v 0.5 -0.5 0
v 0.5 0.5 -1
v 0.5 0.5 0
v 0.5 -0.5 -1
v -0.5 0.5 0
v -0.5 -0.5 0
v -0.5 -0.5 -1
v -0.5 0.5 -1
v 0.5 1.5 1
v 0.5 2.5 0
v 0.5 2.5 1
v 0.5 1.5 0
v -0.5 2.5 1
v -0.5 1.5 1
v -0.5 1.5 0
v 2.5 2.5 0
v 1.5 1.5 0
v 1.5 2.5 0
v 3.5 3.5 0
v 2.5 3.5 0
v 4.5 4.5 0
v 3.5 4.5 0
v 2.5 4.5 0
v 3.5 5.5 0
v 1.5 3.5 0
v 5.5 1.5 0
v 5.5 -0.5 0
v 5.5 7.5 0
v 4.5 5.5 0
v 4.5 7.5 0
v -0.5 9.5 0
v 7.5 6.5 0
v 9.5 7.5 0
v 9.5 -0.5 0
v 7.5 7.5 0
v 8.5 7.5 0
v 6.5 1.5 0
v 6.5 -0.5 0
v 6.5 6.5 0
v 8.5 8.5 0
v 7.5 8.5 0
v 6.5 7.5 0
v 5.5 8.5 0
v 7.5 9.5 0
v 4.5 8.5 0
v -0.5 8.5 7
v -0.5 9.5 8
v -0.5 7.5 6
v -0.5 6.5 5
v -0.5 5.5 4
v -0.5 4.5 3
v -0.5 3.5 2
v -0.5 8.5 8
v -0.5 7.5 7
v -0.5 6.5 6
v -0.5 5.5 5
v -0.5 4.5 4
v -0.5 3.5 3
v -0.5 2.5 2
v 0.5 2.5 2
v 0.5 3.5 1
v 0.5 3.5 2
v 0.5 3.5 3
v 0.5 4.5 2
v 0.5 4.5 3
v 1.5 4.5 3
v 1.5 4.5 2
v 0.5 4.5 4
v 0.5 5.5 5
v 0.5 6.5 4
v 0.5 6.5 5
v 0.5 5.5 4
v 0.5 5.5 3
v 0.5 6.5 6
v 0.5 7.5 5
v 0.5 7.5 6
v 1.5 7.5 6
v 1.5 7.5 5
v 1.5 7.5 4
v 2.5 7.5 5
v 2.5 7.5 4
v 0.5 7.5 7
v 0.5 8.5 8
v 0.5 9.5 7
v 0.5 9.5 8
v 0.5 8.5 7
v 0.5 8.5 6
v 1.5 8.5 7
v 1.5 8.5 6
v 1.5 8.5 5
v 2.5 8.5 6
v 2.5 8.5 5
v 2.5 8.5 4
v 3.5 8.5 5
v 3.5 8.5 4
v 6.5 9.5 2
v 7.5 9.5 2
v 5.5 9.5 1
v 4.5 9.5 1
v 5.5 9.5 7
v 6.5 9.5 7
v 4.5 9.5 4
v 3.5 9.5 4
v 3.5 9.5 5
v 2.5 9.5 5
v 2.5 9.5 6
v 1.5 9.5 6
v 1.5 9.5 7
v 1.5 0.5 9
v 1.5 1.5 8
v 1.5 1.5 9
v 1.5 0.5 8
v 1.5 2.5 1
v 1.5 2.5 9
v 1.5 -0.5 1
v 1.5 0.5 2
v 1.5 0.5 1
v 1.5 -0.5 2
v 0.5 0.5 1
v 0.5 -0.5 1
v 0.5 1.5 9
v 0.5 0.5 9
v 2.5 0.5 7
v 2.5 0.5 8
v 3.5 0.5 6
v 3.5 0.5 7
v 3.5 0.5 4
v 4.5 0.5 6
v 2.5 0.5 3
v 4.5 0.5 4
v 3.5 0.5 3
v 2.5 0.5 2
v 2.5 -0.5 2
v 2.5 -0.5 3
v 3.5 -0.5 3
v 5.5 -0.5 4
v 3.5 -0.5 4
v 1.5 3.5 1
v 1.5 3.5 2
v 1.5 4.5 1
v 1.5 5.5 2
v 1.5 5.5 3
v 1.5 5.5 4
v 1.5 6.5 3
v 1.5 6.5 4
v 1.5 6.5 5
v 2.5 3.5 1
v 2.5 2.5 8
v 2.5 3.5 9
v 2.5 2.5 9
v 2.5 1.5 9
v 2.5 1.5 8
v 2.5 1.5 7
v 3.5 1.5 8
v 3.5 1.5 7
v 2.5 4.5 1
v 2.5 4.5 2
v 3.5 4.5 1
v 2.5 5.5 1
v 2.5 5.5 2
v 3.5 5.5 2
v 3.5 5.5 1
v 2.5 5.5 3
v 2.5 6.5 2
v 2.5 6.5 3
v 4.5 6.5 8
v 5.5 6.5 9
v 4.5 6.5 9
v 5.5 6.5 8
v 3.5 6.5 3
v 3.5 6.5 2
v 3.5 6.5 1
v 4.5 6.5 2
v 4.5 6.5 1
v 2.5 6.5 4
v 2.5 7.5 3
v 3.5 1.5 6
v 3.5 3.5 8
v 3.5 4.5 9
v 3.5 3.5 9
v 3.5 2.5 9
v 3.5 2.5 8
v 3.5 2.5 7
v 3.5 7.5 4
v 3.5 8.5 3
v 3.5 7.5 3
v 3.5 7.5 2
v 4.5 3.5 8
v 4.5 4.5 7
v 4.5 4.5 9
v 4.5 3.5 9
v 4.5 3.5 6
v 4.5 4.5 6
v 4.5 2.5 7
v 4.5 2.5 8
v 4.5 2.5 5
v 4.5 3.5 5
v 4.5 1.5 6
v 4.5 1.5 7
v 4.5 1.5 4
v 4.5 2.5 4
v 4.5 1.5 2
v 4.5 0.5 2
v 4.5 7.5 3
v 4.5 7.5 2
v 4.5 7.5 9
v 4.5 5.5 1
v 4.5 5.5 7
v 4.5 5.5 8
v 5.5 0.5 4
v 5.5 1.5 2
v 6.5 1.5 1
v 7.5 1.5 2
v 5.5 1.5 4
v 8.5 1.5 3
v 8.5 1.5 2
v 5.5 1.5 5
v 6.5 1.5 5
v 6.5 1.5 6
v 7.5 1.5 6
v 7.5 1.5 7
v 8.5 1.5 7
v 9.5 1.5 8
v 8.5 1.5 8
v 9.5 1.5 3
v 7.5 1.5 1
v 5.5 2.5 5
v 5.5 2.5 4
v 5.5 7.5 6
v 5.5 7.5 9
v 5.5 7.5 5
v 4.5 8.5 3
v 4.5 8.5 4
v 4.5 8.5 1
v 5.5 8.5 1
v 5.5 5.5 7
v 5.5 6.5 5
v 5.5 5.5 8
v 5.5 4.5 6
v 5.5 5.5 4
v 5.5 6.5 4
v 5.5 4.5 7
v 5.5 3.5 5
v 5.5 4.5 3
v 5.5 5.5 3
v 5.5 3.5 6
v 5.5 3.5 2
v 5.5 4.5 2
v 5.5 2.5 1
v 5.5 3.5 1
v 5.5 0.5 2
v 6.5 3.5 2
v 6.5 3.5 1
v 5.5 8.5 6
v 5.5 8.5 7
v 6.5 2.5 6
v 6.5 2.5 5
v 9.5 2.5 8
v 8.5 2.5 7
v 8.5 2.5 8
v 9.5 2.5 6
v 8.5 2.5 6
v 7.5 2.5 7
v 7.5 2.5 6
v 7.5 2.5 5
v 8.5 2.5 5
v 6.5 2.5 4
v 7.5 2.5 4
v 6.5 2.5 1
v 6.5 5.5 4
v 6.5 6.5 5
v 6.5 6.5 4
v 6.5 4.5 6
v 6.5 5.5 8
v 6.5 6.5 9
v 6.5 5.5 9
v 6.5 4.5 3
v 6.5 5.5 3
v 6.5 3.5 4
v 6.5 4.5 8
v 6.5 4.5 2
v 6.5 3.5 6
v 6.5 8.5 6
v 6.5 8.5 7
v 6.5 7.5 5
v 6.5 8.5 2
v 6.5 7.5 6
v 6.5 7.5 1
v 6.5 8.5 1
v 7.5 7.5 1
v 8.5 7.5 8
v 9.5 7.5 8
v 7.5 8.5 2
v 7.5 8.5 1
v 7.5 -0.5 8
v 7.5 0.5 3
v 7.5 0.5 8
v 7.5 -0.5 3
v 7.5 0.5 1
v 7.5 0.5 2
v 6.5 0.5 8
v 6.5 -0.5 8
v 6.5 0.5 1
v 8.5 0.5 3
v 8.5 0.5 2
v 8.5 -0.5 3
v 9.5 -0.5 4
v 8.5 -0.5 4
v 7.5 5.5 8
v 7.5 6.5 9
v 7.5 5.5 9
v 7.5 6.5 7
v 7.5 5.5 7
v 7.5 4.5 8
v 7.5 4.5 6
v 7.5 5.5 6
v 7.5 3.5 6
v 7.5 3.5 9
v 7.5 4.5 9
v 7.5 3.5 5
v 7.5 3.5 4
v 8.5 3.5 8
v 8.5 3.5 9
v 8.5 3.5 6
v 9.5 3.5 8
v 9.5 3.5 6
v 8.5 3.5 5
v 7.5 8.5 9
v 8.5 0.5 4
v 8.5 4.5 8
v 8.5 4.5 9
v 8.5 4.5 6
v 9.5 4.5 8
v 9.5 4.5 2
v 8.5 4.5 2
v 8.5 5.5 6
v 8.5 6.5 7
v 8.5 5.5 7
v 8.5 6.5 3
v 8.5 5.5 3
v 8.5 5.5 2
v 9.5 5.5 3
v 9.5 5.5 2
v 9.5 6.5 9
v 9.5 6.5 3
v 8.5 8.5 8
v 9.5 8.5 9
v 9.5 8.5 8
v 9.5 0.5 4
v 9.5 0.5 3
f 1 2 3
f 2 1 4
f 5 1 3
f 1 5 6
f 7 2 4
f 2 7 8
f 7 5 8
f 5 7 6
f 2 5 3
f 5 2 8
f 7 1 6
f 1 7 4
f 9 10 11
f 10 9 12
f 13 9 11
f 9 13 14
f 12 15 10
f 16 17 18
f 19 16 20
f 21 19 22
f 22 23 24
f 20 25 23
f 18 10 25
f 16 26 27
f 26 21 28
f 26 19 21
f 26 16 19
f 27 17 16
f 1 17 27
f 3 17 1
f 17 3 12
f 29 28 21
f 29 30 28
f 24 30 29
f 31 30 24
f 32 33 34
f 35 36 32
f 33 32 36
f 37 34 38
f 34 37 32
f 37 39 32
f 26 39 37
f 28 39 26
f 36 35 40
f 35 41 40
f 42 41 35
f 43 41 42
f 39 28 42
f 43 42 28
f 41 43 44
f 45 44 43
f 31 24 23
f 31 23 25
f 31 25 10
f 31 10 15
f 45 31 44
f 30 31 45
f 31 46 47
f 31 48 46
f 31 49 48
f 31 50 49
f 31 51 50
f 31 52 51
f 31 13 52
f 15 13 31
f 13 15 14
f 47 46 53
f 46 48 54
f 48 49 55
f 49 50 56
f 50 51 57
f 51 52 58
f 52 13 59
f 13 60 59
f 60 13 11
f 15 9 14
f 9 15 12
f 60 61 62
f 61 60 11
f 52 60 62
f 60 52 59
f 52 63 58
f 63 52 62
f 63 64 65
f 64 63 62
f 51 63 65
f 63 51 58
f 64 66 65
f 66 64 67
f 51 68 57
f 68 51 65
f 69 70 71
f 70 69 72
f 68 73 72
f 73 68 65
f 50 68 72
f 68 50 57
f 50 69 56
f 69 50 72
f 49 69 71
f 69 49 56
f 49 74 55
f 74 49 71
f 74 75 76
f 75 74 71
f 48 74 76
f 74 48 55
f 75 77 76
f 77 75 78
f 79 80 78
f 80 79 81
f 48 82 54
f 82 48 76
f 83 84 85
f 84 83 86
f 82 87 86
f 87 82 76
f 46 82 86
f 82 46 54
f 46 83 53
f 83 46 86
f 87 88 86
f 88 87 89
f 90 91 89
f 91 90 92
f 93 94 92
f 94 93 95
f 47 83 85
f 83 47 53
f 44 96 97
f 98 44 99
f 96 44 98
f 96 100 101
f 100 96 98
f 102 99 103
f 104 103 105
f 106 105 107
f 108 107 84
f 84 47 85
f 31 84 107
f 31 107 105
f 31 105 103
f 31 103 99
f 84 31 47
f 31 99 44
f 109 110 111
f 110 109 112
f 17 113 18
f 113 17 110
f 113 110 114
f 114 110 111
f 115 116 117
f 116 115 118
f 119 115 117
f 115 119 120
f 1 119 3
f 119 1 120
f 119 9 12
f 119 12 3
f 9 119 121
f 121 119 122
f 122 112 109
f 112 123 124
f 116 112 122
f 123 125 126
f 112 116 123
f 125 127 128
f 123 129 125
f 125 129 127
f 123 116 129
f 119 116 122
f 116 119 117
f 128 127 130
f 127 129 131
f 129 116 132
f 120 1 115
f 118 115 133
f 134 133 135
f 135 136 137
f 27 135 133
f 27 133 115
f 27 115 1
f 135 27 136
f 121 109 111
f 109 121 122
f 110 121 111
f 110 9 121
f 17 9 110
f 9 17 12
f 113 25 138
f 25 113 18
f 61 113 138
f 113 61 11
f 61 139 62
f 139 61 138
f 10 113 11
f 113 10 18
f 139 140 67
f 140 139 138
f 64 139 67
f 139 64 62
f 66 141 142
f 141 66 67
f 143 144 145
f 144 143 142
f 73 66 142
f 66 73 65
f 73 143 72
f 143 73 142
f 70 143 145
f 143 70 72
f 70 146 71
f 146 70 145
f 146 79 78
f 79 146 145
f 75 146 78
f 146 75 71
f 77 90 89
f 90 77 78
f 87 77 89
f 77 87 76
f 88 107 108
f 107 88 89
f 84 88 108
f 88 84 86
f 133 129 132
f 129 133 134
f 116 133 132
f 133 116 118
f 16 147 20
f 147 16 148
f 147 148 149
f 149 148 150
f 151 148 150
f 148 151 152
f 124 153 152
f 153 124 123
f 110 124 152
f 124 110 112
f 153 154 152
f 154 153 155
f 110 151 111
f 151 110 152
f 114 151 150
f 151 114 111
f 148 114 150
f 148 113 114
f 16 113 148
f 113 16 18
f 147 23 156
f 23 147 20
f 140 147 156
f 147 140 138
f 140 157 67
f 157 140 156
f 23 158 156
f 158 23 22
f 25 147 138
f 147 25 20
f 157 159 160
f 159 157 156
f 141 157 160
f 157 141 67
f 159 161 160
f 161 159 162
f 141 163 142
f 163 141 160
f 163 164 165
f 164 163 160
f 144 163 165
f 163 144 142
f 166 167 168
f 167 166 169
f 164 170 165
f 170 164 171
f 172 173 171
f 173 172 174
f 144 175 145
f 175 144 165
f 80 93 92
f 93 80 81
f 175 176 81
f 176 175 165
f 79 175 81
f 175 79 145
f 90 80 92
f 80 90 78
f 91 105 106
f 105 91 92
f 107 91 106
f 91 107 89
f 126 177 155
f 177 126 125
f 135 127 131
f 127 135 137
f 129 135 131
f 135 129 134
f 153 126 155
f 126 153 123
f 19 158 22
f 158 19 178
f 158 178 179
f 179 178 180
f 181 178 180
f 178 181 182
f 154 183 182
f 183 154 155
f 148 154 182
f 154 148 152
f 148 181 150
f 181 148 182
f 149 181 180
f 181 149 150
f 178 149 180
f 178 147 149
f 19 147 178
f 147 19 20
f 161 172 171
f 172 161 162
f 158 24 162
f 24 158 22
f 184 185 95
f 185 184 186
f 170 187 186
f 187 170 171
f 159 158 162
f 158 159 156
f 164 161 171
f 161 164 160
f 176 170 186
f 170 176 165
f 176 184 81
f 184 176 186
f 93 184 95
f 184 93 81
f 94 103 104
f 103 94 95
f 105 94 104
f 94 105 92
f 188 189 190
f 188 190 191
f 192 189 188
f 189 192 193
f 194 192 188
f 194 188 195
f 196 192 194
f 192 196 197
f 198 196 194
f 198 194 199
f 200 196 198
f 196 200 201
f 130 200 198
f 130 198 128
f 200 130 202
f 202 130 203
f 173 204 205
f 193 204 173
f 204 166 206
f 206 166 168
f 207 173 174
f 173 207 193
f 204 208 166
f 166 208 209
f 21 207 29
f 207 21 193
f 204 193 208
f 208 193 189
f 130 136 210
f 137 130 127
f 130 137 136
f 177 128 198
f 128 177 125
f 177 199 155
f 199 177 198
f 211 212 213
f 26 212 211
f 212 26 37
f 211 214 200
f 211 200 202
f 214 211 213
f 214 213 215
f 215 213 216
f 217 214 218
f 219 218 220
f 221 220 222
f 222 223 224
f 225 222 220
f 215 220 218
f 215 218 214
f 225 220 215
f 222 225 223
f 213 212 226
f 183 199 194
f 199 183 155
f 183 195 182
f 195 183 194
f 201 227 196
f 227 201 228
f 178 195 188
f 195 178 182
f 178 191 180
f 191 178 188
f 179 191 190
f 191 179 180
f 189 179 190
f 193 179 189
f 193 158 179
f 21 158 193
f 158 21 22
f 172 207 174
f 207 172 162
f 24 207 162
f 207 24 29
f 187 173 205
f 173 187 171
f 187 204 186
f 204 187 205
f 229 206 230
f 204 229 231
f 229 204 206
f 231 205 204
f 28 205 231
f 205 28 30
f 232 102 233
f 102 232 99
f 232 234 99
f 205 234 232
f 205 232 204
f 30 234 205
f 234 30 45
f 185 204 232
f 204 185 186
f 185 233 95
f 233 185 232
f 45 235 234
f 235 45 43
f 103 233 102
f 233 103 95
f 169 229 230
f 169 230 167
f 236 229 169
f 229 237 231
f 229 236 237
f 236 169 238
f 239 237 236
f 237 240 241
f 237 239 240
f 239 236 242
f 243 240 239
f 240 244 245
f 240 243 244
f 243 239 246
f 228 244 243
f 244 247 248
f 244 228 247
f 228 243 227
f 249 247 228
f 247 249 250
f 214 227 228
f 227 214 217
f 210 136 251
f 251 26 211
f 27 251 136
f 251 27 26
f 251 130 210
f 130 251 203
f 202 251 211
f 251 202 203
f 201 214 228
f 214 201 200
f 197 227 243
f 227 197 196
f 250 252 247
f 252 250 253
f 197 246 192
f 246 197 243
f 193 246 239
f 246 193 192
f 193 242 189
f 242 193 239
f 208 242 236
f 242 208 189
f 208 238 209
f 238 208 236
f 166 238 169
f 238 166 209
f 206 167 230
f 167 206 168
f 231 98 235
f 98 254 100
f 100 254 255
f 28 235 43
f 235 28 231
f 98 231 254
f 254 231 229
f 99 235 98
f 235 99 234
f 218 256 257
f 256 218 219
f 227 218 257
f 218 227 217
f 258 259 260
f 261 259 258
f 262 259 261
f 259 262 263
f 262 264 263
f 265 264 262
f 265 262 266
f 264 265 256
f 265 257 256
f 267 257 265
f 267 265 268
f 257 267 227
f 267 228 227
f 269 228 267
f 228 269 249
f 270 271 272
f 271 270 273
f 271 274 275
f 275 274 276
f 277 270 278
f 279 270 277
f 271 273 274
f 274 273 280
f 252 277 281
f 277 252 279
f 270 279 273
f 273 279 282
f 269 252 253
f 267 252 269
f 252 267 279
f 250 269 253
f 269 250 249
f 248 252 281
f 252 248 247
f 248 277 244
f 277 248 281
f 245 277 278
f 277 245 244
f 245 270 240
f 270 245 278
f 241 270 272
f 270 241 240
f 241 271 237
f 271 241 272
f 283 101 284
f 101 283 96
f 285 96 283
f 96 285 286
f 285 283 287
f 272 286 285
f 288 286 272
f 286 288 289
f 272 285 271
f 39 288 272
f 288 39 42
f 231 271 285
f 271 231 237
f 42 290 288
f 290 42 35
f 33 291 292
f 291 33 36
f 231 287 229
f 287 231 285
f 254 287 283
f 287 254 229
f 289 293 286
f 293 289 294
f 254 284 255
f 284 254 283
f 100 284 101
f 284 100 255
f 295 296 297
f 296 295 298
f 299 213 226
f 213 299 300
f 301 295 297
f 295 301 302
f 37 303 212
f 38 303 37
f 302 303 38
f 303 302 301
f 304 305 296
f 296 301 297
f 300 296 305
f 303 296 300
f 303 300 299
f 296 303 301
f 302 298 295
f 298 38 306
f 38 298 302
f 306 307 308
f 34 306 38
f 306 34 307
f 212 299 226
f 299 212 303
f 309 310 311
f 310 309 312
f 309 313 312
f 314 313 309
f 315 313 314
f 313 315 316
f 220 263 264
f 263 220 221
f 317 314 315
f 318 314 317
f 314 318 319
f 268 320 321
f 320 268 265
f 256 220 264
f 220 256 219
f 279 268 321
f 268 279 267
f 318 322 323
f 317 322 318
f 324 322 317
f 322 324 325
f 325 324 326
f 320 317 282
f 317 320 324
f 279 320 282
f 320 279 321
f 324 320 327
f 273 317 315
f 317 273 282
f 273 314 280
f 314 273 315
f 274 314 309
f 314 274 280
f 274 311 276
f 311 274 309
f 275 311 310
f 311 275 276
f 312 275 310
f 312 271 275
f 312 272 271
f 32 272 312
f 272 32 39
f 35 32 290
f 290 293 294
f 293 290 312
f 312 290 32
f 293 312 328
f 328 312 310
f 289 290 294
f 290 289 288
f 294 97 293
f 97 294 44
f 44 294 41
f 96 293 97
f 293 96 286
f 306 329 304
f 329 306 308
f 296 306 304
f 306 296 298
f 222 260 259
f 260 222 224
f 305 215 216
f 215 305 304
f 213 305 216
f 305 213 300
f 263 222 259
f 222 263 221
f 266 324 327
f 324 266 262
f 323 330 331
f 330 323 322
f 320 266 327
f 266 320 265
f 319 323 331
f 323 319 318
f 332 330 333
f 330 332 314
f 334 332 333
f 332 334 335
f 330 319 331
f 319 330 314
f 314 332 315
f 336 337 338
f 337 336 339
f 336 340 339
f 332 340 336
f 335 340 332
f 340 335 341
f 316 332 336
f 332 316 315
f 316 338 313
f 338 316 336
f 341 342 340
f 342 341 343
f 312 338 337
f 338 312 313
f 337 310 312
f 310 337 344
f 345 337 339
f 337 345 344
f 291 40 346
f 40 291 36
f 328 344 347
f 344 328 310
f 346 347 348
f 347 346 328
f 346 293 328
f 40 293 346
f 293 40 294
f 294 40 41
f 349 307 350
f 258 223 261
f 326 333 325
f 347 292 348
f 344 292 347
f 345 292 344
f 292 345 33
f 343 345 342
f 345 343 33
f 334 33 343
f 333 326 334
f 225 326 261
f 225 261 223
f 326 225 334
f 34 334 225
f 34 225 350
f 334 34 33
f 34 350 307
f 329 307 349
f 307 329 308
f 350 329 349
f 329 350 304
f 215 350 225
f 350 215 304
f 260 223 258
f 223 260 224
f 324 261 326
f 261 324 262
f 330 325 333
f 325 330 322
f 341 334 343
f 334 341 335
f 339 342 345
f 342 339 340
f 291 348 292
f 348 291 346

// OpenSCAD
union() {
    translate([0, 0, -0.5]) color([1, 0, 0]) cube([1, 1, 1], center=true);
    translate([0, 2, 0.5]) cube([1, 1, 1], center=true);
    translate([0, 3, 1.0]) cube([1, 1, 2], center=true);
    translate([0, 4, 1.5]) cube([1, 1, 3], center=true);
    translate([0, 5, 2.0]) cube([1, 1, 4], center=true);
    translate([0, 6, 2.5]) cube([1, 1, 5], center=true);
    translate([0, 7, 3.0]) cube([1, 1, 6], center=true);
    translate([0, 8, 3.5]) cube([1, 1, 7], center=true);
    translate([0, 9, 4.0]) cube([1, 1, 8], center=true);
    translate([1, 0, 0.5]) cube([1, 1, 1], center=true);
    translate([1, 1, 4.5]) cube([1, 1, 9], center=true);
    translate([1, 3, 0.5]) cube([1, 1, 1], center=true);
    translate([1, 4, 1.0]) cube([1, 1, 2], center=true);
    translate([1, 5, 1.5]) cube([1, 1, 3], center=true);
    translate([1, 6, 2.0]) cube([1, 1, 4], center=true);
    translate([1, 7, 2.5]) cube([1, 1, 5], center=true);
    translate([1, 8, 3.0]) cube([1, 1, 6], center=true);
    translate([1, 9, 3.5]) cube([1, 1, 7], center=true);
    translate([2, 0, 1.0]) cube([1, 1, 2], center=true);
    translate([2, 1, 4.0]) cube([1, 1, 8], center=true);
    translate([2, 2, 4.5]) cube([1, 1, 9], center=true);
    translate([2, 4, 0.5]) cube([1, 1, 1], center=true);
    translate([2, 5, 1.0]) cube([1, 1, 2], center=true);
    translate([2, 6, 1.5]) cube([1, 1, 3], center=true);
    translate([2, 7, 2.0]) cube([1, 1, 4], center=true);
    translate([2, 8, 2.5]) cube([1, 1, 5], center=true);
    translate([2, 9, 3.0]) cube([1, 1, 6], center=true);
    translate([3, 0, 1.5]) cube([1, 1, 3], center=true);
    translate([3, 1, 3.5]) cube([1, 1, 7], center=true);
    translate([3, 2, 4.0]) cube([1, 1, 8], center=true);
    translate([3, 3, 4.5]) cube([1, 1, 9], center=true);
    translate([3, 5, 0.5]) cube([1, 1, 1], center=true);
    translate([3, 6, 1.0]) cube([1, 1, 2], center=true);
    translate([3, 7, 1.5]) cube([1, 1, 3], center=true);
    translate([3, 8, 2.0]) cube([1, 1, 4], center=true);
    translate([3, 9, 2.5]) cube([1, 1, 5], center=true);
    translate([4, 0, 2.0]) cube([1, 1, 4], center=true);
    translate([4, 1, 3.0]) cube([1, 1, 6], center=true);
    translate([4, 2, 3.5]) cube([1, 1, 7], center=true);
    translate([4, 3, 4.0]) cube([1, 1, 8], center=true);
    translate([4, 4, 4.5]) cube([1, 1, 9], center=true);
    translate([4, 6, 0.5]) cube([1, 1, 1], center=true);
    translate([4, 7, 1.0]) cube([1, 1, 2], center=true);
    translate([4, 8, 1.5]) cube([1, 1, 3], center=true);
    translate([4, 9, 2.0]) cube([1, 1, 4], center=true);
    translate([5, 0, 2.0]) cube([1, 1, 4], center=true);
    translate([5, 1, 1.0]) cube([1, 1, 2], center=true);
    translate([5, 2, 2.0]) cube([1, 1, 4], center=true);
    translate([5, 3, 2.5]) cube([1, 1, 5], center=true);
    translate([5, 4, 3.0]) cube([1, 1, 6], center=true);
    translate([5, 5, 3.5]) cube([1, 1, 7], center=true);
    translate([5, 6, 4.0]) cube([1, 1, 8], center=true);
    translate([5, 7, 4.5]) cube([1, 1, 9], center=true);
    translate([5, 9, 0.5]) cube([1, 1, 1], center=true);
    translate([6, 2, 2.5]) cube([1, 1, 5], center=true);
    translate([6, 3, 0.5]) cube([1, 1, 1], center=true);
    translate([6, 4, 1.0]) cube([1, 1, 2], center=true);
    translate([6, 5, 1.5]) cube([1, 1, 3], center=true);
    translate([6, 6, 2.0]) cube([1, 1, 4], center=true);
    translate([6, 7, 2.5]) cube([1, 1, 5], center=true);
    translate([6, 8, 3.0]) cube([1, 1, 6], center=true);
    translate([6, 9, 3.5]) cube([1, 1, 7], center=true);
    translate([7, 0, 4.0]) cube([1, 1, 8], center=true);
    translate([7, 1, 0.5]) cube([1, 1, 1], center=true);
    translate([7, 2, 3.0]) cube([1, 1, 6], center=true);
    translate([7, 3, 2.0]) cube([1, 1, 4], center=true);
    translate([7, 4, 3.0]) cube([1, 1, 6], center=true);
    translate([7, 5, 4.0]) cube([1, 1, 8], center=true);
    translate([7, 6, 4.5]) cube([1, 1, 9], center=true);
    translate([7, 8, 0.5]) cube([1, 1, 1], center=true);
    translate([7, 9, 1.0]) cube([1, 1, 2], center=true);
    translate([8, 0, 1.5]) cube([1, 1, 3], center=true);
    translate([8, 1, 1.0]) cube([1, 1, 2], center=true);
    translate([8, 2, 3.5]) cube([1, 1, 7], center=true);
    translate([8, 3, 2.5]) cube([1, 1, 5], center=true);
    translate([8, 4, 4.5]) cube([1, 1, 9], center=true);
    translate([8, 5, 3.0]) cube([1, 1, 6], center=true);
    translate([8, 6, 3.5]) cube([1, 1, 7], center=true);
    translate([8, 7, 4.5]) cube([1, 1, 9], center=true);
    translate([8, 8, 4.5]) cube([1, 1, 9], center=true);
    translate([9, 0, 2.0]) cube([1, 1, 4], center=true);
    translate([9, 1, 1.5]) cube([1, 1, 3], center=true);
    translate([9, 2, 4.0]) cube([1, 1, 8], center=true);
    translate([9, 3, 3.0]) cube([1, 1, 6], center=true);
    translate([9, 4, 4.0]) cube([1, 1, 8], center=true);
    translate([9, 5, 1.0]) cube([1, 1, 2], center=true);
    translate([9, 6, 1.5]) cube([1, 1, 3], center=true);
    translate([9, 7, 4.5]) cube([1, 1, 9], center=true);
    translate([9, 8, 8.5]) color([0, 0, 1]) cube([1, 1, 1], center=true);
}
